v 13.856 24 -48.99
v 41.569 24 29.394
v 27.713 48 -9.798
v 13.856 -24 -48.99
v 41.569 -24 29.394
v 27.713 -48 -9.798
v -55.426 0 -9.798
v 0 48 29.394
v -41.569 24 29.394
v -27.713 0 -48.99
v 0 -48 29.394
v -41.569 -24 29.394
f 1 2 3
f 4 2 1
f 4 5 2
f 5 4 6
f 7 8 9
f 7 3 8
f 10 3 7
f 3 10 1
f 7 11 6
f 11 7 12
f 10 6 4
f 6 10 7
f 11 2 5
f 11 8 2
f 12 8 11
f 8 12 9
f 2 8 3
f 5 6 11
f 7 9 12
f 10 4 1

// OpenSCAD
// ArquimedianSolids v.01
// (C) @oblomobka - 2023.01
// GPL license

/* **CUSTOMIZER VARIABLES** */
// Edge of truncatedTetrahedron (h ****)
tT_Edge=48; //[10:100]
// Center of the solid or stand over a face
Position = "Face"; //["Center", "Face"]
// Distance between solids in the rendering
Matrix = 70; //[50:200]

/* **MODULES** */
module truncatedTetrahedron(edge=20, position="Face"){ //tT (Conway notation)
    // Constants
    diAngle_tT = acos(1/3); // dihedral angle between hexagonal faces of tT  = 70.529
    
    // Variables
    x=edge/sqrt(8);
    
    // Definition of points and faces
    tTpoints=[  [3*x,x,x],[x,3*x,x],[x,x,3*x],
                [-3*x,-x,x],[-x,-3*x,x],[-x,-x,3*x],
                [-3*x,x,-x],[-x,3*x,-x],[-x,x,-3*x],
                [3*x,-x,-x],[x,-3*x,-x],[x,-x,-3*x]
                ];
    tTfaces=[   [0,2,5,4,10,9],[7,1,0,9,11,8],[4,3,6,8,11,10],[1,7,6,3,5,2],
                [0,1,2],[3,4,5],[6,7,8],[9,10,11]
    ];

    
    // tT stands on xy plane centered on the center of the face or centered on the center of polyhedron
    if(position=="Face"){
        //translate([0,0,edge*(hTetrahedron-rCirTetrahedron)])
            rotate([0, 90-diAngle_tT/2, 0])
                rotate([0, 0, 45])
                    polyhedron(tTpoints,tTfaces);}
    else if(position=="Center") {
        polyhedron(tTpoints,tTfaces);}
    }
    
/* **RENDERING OF SOLIDS** */ 
truncatedTetrahedron(edge=tT_Edge, position=Position);
